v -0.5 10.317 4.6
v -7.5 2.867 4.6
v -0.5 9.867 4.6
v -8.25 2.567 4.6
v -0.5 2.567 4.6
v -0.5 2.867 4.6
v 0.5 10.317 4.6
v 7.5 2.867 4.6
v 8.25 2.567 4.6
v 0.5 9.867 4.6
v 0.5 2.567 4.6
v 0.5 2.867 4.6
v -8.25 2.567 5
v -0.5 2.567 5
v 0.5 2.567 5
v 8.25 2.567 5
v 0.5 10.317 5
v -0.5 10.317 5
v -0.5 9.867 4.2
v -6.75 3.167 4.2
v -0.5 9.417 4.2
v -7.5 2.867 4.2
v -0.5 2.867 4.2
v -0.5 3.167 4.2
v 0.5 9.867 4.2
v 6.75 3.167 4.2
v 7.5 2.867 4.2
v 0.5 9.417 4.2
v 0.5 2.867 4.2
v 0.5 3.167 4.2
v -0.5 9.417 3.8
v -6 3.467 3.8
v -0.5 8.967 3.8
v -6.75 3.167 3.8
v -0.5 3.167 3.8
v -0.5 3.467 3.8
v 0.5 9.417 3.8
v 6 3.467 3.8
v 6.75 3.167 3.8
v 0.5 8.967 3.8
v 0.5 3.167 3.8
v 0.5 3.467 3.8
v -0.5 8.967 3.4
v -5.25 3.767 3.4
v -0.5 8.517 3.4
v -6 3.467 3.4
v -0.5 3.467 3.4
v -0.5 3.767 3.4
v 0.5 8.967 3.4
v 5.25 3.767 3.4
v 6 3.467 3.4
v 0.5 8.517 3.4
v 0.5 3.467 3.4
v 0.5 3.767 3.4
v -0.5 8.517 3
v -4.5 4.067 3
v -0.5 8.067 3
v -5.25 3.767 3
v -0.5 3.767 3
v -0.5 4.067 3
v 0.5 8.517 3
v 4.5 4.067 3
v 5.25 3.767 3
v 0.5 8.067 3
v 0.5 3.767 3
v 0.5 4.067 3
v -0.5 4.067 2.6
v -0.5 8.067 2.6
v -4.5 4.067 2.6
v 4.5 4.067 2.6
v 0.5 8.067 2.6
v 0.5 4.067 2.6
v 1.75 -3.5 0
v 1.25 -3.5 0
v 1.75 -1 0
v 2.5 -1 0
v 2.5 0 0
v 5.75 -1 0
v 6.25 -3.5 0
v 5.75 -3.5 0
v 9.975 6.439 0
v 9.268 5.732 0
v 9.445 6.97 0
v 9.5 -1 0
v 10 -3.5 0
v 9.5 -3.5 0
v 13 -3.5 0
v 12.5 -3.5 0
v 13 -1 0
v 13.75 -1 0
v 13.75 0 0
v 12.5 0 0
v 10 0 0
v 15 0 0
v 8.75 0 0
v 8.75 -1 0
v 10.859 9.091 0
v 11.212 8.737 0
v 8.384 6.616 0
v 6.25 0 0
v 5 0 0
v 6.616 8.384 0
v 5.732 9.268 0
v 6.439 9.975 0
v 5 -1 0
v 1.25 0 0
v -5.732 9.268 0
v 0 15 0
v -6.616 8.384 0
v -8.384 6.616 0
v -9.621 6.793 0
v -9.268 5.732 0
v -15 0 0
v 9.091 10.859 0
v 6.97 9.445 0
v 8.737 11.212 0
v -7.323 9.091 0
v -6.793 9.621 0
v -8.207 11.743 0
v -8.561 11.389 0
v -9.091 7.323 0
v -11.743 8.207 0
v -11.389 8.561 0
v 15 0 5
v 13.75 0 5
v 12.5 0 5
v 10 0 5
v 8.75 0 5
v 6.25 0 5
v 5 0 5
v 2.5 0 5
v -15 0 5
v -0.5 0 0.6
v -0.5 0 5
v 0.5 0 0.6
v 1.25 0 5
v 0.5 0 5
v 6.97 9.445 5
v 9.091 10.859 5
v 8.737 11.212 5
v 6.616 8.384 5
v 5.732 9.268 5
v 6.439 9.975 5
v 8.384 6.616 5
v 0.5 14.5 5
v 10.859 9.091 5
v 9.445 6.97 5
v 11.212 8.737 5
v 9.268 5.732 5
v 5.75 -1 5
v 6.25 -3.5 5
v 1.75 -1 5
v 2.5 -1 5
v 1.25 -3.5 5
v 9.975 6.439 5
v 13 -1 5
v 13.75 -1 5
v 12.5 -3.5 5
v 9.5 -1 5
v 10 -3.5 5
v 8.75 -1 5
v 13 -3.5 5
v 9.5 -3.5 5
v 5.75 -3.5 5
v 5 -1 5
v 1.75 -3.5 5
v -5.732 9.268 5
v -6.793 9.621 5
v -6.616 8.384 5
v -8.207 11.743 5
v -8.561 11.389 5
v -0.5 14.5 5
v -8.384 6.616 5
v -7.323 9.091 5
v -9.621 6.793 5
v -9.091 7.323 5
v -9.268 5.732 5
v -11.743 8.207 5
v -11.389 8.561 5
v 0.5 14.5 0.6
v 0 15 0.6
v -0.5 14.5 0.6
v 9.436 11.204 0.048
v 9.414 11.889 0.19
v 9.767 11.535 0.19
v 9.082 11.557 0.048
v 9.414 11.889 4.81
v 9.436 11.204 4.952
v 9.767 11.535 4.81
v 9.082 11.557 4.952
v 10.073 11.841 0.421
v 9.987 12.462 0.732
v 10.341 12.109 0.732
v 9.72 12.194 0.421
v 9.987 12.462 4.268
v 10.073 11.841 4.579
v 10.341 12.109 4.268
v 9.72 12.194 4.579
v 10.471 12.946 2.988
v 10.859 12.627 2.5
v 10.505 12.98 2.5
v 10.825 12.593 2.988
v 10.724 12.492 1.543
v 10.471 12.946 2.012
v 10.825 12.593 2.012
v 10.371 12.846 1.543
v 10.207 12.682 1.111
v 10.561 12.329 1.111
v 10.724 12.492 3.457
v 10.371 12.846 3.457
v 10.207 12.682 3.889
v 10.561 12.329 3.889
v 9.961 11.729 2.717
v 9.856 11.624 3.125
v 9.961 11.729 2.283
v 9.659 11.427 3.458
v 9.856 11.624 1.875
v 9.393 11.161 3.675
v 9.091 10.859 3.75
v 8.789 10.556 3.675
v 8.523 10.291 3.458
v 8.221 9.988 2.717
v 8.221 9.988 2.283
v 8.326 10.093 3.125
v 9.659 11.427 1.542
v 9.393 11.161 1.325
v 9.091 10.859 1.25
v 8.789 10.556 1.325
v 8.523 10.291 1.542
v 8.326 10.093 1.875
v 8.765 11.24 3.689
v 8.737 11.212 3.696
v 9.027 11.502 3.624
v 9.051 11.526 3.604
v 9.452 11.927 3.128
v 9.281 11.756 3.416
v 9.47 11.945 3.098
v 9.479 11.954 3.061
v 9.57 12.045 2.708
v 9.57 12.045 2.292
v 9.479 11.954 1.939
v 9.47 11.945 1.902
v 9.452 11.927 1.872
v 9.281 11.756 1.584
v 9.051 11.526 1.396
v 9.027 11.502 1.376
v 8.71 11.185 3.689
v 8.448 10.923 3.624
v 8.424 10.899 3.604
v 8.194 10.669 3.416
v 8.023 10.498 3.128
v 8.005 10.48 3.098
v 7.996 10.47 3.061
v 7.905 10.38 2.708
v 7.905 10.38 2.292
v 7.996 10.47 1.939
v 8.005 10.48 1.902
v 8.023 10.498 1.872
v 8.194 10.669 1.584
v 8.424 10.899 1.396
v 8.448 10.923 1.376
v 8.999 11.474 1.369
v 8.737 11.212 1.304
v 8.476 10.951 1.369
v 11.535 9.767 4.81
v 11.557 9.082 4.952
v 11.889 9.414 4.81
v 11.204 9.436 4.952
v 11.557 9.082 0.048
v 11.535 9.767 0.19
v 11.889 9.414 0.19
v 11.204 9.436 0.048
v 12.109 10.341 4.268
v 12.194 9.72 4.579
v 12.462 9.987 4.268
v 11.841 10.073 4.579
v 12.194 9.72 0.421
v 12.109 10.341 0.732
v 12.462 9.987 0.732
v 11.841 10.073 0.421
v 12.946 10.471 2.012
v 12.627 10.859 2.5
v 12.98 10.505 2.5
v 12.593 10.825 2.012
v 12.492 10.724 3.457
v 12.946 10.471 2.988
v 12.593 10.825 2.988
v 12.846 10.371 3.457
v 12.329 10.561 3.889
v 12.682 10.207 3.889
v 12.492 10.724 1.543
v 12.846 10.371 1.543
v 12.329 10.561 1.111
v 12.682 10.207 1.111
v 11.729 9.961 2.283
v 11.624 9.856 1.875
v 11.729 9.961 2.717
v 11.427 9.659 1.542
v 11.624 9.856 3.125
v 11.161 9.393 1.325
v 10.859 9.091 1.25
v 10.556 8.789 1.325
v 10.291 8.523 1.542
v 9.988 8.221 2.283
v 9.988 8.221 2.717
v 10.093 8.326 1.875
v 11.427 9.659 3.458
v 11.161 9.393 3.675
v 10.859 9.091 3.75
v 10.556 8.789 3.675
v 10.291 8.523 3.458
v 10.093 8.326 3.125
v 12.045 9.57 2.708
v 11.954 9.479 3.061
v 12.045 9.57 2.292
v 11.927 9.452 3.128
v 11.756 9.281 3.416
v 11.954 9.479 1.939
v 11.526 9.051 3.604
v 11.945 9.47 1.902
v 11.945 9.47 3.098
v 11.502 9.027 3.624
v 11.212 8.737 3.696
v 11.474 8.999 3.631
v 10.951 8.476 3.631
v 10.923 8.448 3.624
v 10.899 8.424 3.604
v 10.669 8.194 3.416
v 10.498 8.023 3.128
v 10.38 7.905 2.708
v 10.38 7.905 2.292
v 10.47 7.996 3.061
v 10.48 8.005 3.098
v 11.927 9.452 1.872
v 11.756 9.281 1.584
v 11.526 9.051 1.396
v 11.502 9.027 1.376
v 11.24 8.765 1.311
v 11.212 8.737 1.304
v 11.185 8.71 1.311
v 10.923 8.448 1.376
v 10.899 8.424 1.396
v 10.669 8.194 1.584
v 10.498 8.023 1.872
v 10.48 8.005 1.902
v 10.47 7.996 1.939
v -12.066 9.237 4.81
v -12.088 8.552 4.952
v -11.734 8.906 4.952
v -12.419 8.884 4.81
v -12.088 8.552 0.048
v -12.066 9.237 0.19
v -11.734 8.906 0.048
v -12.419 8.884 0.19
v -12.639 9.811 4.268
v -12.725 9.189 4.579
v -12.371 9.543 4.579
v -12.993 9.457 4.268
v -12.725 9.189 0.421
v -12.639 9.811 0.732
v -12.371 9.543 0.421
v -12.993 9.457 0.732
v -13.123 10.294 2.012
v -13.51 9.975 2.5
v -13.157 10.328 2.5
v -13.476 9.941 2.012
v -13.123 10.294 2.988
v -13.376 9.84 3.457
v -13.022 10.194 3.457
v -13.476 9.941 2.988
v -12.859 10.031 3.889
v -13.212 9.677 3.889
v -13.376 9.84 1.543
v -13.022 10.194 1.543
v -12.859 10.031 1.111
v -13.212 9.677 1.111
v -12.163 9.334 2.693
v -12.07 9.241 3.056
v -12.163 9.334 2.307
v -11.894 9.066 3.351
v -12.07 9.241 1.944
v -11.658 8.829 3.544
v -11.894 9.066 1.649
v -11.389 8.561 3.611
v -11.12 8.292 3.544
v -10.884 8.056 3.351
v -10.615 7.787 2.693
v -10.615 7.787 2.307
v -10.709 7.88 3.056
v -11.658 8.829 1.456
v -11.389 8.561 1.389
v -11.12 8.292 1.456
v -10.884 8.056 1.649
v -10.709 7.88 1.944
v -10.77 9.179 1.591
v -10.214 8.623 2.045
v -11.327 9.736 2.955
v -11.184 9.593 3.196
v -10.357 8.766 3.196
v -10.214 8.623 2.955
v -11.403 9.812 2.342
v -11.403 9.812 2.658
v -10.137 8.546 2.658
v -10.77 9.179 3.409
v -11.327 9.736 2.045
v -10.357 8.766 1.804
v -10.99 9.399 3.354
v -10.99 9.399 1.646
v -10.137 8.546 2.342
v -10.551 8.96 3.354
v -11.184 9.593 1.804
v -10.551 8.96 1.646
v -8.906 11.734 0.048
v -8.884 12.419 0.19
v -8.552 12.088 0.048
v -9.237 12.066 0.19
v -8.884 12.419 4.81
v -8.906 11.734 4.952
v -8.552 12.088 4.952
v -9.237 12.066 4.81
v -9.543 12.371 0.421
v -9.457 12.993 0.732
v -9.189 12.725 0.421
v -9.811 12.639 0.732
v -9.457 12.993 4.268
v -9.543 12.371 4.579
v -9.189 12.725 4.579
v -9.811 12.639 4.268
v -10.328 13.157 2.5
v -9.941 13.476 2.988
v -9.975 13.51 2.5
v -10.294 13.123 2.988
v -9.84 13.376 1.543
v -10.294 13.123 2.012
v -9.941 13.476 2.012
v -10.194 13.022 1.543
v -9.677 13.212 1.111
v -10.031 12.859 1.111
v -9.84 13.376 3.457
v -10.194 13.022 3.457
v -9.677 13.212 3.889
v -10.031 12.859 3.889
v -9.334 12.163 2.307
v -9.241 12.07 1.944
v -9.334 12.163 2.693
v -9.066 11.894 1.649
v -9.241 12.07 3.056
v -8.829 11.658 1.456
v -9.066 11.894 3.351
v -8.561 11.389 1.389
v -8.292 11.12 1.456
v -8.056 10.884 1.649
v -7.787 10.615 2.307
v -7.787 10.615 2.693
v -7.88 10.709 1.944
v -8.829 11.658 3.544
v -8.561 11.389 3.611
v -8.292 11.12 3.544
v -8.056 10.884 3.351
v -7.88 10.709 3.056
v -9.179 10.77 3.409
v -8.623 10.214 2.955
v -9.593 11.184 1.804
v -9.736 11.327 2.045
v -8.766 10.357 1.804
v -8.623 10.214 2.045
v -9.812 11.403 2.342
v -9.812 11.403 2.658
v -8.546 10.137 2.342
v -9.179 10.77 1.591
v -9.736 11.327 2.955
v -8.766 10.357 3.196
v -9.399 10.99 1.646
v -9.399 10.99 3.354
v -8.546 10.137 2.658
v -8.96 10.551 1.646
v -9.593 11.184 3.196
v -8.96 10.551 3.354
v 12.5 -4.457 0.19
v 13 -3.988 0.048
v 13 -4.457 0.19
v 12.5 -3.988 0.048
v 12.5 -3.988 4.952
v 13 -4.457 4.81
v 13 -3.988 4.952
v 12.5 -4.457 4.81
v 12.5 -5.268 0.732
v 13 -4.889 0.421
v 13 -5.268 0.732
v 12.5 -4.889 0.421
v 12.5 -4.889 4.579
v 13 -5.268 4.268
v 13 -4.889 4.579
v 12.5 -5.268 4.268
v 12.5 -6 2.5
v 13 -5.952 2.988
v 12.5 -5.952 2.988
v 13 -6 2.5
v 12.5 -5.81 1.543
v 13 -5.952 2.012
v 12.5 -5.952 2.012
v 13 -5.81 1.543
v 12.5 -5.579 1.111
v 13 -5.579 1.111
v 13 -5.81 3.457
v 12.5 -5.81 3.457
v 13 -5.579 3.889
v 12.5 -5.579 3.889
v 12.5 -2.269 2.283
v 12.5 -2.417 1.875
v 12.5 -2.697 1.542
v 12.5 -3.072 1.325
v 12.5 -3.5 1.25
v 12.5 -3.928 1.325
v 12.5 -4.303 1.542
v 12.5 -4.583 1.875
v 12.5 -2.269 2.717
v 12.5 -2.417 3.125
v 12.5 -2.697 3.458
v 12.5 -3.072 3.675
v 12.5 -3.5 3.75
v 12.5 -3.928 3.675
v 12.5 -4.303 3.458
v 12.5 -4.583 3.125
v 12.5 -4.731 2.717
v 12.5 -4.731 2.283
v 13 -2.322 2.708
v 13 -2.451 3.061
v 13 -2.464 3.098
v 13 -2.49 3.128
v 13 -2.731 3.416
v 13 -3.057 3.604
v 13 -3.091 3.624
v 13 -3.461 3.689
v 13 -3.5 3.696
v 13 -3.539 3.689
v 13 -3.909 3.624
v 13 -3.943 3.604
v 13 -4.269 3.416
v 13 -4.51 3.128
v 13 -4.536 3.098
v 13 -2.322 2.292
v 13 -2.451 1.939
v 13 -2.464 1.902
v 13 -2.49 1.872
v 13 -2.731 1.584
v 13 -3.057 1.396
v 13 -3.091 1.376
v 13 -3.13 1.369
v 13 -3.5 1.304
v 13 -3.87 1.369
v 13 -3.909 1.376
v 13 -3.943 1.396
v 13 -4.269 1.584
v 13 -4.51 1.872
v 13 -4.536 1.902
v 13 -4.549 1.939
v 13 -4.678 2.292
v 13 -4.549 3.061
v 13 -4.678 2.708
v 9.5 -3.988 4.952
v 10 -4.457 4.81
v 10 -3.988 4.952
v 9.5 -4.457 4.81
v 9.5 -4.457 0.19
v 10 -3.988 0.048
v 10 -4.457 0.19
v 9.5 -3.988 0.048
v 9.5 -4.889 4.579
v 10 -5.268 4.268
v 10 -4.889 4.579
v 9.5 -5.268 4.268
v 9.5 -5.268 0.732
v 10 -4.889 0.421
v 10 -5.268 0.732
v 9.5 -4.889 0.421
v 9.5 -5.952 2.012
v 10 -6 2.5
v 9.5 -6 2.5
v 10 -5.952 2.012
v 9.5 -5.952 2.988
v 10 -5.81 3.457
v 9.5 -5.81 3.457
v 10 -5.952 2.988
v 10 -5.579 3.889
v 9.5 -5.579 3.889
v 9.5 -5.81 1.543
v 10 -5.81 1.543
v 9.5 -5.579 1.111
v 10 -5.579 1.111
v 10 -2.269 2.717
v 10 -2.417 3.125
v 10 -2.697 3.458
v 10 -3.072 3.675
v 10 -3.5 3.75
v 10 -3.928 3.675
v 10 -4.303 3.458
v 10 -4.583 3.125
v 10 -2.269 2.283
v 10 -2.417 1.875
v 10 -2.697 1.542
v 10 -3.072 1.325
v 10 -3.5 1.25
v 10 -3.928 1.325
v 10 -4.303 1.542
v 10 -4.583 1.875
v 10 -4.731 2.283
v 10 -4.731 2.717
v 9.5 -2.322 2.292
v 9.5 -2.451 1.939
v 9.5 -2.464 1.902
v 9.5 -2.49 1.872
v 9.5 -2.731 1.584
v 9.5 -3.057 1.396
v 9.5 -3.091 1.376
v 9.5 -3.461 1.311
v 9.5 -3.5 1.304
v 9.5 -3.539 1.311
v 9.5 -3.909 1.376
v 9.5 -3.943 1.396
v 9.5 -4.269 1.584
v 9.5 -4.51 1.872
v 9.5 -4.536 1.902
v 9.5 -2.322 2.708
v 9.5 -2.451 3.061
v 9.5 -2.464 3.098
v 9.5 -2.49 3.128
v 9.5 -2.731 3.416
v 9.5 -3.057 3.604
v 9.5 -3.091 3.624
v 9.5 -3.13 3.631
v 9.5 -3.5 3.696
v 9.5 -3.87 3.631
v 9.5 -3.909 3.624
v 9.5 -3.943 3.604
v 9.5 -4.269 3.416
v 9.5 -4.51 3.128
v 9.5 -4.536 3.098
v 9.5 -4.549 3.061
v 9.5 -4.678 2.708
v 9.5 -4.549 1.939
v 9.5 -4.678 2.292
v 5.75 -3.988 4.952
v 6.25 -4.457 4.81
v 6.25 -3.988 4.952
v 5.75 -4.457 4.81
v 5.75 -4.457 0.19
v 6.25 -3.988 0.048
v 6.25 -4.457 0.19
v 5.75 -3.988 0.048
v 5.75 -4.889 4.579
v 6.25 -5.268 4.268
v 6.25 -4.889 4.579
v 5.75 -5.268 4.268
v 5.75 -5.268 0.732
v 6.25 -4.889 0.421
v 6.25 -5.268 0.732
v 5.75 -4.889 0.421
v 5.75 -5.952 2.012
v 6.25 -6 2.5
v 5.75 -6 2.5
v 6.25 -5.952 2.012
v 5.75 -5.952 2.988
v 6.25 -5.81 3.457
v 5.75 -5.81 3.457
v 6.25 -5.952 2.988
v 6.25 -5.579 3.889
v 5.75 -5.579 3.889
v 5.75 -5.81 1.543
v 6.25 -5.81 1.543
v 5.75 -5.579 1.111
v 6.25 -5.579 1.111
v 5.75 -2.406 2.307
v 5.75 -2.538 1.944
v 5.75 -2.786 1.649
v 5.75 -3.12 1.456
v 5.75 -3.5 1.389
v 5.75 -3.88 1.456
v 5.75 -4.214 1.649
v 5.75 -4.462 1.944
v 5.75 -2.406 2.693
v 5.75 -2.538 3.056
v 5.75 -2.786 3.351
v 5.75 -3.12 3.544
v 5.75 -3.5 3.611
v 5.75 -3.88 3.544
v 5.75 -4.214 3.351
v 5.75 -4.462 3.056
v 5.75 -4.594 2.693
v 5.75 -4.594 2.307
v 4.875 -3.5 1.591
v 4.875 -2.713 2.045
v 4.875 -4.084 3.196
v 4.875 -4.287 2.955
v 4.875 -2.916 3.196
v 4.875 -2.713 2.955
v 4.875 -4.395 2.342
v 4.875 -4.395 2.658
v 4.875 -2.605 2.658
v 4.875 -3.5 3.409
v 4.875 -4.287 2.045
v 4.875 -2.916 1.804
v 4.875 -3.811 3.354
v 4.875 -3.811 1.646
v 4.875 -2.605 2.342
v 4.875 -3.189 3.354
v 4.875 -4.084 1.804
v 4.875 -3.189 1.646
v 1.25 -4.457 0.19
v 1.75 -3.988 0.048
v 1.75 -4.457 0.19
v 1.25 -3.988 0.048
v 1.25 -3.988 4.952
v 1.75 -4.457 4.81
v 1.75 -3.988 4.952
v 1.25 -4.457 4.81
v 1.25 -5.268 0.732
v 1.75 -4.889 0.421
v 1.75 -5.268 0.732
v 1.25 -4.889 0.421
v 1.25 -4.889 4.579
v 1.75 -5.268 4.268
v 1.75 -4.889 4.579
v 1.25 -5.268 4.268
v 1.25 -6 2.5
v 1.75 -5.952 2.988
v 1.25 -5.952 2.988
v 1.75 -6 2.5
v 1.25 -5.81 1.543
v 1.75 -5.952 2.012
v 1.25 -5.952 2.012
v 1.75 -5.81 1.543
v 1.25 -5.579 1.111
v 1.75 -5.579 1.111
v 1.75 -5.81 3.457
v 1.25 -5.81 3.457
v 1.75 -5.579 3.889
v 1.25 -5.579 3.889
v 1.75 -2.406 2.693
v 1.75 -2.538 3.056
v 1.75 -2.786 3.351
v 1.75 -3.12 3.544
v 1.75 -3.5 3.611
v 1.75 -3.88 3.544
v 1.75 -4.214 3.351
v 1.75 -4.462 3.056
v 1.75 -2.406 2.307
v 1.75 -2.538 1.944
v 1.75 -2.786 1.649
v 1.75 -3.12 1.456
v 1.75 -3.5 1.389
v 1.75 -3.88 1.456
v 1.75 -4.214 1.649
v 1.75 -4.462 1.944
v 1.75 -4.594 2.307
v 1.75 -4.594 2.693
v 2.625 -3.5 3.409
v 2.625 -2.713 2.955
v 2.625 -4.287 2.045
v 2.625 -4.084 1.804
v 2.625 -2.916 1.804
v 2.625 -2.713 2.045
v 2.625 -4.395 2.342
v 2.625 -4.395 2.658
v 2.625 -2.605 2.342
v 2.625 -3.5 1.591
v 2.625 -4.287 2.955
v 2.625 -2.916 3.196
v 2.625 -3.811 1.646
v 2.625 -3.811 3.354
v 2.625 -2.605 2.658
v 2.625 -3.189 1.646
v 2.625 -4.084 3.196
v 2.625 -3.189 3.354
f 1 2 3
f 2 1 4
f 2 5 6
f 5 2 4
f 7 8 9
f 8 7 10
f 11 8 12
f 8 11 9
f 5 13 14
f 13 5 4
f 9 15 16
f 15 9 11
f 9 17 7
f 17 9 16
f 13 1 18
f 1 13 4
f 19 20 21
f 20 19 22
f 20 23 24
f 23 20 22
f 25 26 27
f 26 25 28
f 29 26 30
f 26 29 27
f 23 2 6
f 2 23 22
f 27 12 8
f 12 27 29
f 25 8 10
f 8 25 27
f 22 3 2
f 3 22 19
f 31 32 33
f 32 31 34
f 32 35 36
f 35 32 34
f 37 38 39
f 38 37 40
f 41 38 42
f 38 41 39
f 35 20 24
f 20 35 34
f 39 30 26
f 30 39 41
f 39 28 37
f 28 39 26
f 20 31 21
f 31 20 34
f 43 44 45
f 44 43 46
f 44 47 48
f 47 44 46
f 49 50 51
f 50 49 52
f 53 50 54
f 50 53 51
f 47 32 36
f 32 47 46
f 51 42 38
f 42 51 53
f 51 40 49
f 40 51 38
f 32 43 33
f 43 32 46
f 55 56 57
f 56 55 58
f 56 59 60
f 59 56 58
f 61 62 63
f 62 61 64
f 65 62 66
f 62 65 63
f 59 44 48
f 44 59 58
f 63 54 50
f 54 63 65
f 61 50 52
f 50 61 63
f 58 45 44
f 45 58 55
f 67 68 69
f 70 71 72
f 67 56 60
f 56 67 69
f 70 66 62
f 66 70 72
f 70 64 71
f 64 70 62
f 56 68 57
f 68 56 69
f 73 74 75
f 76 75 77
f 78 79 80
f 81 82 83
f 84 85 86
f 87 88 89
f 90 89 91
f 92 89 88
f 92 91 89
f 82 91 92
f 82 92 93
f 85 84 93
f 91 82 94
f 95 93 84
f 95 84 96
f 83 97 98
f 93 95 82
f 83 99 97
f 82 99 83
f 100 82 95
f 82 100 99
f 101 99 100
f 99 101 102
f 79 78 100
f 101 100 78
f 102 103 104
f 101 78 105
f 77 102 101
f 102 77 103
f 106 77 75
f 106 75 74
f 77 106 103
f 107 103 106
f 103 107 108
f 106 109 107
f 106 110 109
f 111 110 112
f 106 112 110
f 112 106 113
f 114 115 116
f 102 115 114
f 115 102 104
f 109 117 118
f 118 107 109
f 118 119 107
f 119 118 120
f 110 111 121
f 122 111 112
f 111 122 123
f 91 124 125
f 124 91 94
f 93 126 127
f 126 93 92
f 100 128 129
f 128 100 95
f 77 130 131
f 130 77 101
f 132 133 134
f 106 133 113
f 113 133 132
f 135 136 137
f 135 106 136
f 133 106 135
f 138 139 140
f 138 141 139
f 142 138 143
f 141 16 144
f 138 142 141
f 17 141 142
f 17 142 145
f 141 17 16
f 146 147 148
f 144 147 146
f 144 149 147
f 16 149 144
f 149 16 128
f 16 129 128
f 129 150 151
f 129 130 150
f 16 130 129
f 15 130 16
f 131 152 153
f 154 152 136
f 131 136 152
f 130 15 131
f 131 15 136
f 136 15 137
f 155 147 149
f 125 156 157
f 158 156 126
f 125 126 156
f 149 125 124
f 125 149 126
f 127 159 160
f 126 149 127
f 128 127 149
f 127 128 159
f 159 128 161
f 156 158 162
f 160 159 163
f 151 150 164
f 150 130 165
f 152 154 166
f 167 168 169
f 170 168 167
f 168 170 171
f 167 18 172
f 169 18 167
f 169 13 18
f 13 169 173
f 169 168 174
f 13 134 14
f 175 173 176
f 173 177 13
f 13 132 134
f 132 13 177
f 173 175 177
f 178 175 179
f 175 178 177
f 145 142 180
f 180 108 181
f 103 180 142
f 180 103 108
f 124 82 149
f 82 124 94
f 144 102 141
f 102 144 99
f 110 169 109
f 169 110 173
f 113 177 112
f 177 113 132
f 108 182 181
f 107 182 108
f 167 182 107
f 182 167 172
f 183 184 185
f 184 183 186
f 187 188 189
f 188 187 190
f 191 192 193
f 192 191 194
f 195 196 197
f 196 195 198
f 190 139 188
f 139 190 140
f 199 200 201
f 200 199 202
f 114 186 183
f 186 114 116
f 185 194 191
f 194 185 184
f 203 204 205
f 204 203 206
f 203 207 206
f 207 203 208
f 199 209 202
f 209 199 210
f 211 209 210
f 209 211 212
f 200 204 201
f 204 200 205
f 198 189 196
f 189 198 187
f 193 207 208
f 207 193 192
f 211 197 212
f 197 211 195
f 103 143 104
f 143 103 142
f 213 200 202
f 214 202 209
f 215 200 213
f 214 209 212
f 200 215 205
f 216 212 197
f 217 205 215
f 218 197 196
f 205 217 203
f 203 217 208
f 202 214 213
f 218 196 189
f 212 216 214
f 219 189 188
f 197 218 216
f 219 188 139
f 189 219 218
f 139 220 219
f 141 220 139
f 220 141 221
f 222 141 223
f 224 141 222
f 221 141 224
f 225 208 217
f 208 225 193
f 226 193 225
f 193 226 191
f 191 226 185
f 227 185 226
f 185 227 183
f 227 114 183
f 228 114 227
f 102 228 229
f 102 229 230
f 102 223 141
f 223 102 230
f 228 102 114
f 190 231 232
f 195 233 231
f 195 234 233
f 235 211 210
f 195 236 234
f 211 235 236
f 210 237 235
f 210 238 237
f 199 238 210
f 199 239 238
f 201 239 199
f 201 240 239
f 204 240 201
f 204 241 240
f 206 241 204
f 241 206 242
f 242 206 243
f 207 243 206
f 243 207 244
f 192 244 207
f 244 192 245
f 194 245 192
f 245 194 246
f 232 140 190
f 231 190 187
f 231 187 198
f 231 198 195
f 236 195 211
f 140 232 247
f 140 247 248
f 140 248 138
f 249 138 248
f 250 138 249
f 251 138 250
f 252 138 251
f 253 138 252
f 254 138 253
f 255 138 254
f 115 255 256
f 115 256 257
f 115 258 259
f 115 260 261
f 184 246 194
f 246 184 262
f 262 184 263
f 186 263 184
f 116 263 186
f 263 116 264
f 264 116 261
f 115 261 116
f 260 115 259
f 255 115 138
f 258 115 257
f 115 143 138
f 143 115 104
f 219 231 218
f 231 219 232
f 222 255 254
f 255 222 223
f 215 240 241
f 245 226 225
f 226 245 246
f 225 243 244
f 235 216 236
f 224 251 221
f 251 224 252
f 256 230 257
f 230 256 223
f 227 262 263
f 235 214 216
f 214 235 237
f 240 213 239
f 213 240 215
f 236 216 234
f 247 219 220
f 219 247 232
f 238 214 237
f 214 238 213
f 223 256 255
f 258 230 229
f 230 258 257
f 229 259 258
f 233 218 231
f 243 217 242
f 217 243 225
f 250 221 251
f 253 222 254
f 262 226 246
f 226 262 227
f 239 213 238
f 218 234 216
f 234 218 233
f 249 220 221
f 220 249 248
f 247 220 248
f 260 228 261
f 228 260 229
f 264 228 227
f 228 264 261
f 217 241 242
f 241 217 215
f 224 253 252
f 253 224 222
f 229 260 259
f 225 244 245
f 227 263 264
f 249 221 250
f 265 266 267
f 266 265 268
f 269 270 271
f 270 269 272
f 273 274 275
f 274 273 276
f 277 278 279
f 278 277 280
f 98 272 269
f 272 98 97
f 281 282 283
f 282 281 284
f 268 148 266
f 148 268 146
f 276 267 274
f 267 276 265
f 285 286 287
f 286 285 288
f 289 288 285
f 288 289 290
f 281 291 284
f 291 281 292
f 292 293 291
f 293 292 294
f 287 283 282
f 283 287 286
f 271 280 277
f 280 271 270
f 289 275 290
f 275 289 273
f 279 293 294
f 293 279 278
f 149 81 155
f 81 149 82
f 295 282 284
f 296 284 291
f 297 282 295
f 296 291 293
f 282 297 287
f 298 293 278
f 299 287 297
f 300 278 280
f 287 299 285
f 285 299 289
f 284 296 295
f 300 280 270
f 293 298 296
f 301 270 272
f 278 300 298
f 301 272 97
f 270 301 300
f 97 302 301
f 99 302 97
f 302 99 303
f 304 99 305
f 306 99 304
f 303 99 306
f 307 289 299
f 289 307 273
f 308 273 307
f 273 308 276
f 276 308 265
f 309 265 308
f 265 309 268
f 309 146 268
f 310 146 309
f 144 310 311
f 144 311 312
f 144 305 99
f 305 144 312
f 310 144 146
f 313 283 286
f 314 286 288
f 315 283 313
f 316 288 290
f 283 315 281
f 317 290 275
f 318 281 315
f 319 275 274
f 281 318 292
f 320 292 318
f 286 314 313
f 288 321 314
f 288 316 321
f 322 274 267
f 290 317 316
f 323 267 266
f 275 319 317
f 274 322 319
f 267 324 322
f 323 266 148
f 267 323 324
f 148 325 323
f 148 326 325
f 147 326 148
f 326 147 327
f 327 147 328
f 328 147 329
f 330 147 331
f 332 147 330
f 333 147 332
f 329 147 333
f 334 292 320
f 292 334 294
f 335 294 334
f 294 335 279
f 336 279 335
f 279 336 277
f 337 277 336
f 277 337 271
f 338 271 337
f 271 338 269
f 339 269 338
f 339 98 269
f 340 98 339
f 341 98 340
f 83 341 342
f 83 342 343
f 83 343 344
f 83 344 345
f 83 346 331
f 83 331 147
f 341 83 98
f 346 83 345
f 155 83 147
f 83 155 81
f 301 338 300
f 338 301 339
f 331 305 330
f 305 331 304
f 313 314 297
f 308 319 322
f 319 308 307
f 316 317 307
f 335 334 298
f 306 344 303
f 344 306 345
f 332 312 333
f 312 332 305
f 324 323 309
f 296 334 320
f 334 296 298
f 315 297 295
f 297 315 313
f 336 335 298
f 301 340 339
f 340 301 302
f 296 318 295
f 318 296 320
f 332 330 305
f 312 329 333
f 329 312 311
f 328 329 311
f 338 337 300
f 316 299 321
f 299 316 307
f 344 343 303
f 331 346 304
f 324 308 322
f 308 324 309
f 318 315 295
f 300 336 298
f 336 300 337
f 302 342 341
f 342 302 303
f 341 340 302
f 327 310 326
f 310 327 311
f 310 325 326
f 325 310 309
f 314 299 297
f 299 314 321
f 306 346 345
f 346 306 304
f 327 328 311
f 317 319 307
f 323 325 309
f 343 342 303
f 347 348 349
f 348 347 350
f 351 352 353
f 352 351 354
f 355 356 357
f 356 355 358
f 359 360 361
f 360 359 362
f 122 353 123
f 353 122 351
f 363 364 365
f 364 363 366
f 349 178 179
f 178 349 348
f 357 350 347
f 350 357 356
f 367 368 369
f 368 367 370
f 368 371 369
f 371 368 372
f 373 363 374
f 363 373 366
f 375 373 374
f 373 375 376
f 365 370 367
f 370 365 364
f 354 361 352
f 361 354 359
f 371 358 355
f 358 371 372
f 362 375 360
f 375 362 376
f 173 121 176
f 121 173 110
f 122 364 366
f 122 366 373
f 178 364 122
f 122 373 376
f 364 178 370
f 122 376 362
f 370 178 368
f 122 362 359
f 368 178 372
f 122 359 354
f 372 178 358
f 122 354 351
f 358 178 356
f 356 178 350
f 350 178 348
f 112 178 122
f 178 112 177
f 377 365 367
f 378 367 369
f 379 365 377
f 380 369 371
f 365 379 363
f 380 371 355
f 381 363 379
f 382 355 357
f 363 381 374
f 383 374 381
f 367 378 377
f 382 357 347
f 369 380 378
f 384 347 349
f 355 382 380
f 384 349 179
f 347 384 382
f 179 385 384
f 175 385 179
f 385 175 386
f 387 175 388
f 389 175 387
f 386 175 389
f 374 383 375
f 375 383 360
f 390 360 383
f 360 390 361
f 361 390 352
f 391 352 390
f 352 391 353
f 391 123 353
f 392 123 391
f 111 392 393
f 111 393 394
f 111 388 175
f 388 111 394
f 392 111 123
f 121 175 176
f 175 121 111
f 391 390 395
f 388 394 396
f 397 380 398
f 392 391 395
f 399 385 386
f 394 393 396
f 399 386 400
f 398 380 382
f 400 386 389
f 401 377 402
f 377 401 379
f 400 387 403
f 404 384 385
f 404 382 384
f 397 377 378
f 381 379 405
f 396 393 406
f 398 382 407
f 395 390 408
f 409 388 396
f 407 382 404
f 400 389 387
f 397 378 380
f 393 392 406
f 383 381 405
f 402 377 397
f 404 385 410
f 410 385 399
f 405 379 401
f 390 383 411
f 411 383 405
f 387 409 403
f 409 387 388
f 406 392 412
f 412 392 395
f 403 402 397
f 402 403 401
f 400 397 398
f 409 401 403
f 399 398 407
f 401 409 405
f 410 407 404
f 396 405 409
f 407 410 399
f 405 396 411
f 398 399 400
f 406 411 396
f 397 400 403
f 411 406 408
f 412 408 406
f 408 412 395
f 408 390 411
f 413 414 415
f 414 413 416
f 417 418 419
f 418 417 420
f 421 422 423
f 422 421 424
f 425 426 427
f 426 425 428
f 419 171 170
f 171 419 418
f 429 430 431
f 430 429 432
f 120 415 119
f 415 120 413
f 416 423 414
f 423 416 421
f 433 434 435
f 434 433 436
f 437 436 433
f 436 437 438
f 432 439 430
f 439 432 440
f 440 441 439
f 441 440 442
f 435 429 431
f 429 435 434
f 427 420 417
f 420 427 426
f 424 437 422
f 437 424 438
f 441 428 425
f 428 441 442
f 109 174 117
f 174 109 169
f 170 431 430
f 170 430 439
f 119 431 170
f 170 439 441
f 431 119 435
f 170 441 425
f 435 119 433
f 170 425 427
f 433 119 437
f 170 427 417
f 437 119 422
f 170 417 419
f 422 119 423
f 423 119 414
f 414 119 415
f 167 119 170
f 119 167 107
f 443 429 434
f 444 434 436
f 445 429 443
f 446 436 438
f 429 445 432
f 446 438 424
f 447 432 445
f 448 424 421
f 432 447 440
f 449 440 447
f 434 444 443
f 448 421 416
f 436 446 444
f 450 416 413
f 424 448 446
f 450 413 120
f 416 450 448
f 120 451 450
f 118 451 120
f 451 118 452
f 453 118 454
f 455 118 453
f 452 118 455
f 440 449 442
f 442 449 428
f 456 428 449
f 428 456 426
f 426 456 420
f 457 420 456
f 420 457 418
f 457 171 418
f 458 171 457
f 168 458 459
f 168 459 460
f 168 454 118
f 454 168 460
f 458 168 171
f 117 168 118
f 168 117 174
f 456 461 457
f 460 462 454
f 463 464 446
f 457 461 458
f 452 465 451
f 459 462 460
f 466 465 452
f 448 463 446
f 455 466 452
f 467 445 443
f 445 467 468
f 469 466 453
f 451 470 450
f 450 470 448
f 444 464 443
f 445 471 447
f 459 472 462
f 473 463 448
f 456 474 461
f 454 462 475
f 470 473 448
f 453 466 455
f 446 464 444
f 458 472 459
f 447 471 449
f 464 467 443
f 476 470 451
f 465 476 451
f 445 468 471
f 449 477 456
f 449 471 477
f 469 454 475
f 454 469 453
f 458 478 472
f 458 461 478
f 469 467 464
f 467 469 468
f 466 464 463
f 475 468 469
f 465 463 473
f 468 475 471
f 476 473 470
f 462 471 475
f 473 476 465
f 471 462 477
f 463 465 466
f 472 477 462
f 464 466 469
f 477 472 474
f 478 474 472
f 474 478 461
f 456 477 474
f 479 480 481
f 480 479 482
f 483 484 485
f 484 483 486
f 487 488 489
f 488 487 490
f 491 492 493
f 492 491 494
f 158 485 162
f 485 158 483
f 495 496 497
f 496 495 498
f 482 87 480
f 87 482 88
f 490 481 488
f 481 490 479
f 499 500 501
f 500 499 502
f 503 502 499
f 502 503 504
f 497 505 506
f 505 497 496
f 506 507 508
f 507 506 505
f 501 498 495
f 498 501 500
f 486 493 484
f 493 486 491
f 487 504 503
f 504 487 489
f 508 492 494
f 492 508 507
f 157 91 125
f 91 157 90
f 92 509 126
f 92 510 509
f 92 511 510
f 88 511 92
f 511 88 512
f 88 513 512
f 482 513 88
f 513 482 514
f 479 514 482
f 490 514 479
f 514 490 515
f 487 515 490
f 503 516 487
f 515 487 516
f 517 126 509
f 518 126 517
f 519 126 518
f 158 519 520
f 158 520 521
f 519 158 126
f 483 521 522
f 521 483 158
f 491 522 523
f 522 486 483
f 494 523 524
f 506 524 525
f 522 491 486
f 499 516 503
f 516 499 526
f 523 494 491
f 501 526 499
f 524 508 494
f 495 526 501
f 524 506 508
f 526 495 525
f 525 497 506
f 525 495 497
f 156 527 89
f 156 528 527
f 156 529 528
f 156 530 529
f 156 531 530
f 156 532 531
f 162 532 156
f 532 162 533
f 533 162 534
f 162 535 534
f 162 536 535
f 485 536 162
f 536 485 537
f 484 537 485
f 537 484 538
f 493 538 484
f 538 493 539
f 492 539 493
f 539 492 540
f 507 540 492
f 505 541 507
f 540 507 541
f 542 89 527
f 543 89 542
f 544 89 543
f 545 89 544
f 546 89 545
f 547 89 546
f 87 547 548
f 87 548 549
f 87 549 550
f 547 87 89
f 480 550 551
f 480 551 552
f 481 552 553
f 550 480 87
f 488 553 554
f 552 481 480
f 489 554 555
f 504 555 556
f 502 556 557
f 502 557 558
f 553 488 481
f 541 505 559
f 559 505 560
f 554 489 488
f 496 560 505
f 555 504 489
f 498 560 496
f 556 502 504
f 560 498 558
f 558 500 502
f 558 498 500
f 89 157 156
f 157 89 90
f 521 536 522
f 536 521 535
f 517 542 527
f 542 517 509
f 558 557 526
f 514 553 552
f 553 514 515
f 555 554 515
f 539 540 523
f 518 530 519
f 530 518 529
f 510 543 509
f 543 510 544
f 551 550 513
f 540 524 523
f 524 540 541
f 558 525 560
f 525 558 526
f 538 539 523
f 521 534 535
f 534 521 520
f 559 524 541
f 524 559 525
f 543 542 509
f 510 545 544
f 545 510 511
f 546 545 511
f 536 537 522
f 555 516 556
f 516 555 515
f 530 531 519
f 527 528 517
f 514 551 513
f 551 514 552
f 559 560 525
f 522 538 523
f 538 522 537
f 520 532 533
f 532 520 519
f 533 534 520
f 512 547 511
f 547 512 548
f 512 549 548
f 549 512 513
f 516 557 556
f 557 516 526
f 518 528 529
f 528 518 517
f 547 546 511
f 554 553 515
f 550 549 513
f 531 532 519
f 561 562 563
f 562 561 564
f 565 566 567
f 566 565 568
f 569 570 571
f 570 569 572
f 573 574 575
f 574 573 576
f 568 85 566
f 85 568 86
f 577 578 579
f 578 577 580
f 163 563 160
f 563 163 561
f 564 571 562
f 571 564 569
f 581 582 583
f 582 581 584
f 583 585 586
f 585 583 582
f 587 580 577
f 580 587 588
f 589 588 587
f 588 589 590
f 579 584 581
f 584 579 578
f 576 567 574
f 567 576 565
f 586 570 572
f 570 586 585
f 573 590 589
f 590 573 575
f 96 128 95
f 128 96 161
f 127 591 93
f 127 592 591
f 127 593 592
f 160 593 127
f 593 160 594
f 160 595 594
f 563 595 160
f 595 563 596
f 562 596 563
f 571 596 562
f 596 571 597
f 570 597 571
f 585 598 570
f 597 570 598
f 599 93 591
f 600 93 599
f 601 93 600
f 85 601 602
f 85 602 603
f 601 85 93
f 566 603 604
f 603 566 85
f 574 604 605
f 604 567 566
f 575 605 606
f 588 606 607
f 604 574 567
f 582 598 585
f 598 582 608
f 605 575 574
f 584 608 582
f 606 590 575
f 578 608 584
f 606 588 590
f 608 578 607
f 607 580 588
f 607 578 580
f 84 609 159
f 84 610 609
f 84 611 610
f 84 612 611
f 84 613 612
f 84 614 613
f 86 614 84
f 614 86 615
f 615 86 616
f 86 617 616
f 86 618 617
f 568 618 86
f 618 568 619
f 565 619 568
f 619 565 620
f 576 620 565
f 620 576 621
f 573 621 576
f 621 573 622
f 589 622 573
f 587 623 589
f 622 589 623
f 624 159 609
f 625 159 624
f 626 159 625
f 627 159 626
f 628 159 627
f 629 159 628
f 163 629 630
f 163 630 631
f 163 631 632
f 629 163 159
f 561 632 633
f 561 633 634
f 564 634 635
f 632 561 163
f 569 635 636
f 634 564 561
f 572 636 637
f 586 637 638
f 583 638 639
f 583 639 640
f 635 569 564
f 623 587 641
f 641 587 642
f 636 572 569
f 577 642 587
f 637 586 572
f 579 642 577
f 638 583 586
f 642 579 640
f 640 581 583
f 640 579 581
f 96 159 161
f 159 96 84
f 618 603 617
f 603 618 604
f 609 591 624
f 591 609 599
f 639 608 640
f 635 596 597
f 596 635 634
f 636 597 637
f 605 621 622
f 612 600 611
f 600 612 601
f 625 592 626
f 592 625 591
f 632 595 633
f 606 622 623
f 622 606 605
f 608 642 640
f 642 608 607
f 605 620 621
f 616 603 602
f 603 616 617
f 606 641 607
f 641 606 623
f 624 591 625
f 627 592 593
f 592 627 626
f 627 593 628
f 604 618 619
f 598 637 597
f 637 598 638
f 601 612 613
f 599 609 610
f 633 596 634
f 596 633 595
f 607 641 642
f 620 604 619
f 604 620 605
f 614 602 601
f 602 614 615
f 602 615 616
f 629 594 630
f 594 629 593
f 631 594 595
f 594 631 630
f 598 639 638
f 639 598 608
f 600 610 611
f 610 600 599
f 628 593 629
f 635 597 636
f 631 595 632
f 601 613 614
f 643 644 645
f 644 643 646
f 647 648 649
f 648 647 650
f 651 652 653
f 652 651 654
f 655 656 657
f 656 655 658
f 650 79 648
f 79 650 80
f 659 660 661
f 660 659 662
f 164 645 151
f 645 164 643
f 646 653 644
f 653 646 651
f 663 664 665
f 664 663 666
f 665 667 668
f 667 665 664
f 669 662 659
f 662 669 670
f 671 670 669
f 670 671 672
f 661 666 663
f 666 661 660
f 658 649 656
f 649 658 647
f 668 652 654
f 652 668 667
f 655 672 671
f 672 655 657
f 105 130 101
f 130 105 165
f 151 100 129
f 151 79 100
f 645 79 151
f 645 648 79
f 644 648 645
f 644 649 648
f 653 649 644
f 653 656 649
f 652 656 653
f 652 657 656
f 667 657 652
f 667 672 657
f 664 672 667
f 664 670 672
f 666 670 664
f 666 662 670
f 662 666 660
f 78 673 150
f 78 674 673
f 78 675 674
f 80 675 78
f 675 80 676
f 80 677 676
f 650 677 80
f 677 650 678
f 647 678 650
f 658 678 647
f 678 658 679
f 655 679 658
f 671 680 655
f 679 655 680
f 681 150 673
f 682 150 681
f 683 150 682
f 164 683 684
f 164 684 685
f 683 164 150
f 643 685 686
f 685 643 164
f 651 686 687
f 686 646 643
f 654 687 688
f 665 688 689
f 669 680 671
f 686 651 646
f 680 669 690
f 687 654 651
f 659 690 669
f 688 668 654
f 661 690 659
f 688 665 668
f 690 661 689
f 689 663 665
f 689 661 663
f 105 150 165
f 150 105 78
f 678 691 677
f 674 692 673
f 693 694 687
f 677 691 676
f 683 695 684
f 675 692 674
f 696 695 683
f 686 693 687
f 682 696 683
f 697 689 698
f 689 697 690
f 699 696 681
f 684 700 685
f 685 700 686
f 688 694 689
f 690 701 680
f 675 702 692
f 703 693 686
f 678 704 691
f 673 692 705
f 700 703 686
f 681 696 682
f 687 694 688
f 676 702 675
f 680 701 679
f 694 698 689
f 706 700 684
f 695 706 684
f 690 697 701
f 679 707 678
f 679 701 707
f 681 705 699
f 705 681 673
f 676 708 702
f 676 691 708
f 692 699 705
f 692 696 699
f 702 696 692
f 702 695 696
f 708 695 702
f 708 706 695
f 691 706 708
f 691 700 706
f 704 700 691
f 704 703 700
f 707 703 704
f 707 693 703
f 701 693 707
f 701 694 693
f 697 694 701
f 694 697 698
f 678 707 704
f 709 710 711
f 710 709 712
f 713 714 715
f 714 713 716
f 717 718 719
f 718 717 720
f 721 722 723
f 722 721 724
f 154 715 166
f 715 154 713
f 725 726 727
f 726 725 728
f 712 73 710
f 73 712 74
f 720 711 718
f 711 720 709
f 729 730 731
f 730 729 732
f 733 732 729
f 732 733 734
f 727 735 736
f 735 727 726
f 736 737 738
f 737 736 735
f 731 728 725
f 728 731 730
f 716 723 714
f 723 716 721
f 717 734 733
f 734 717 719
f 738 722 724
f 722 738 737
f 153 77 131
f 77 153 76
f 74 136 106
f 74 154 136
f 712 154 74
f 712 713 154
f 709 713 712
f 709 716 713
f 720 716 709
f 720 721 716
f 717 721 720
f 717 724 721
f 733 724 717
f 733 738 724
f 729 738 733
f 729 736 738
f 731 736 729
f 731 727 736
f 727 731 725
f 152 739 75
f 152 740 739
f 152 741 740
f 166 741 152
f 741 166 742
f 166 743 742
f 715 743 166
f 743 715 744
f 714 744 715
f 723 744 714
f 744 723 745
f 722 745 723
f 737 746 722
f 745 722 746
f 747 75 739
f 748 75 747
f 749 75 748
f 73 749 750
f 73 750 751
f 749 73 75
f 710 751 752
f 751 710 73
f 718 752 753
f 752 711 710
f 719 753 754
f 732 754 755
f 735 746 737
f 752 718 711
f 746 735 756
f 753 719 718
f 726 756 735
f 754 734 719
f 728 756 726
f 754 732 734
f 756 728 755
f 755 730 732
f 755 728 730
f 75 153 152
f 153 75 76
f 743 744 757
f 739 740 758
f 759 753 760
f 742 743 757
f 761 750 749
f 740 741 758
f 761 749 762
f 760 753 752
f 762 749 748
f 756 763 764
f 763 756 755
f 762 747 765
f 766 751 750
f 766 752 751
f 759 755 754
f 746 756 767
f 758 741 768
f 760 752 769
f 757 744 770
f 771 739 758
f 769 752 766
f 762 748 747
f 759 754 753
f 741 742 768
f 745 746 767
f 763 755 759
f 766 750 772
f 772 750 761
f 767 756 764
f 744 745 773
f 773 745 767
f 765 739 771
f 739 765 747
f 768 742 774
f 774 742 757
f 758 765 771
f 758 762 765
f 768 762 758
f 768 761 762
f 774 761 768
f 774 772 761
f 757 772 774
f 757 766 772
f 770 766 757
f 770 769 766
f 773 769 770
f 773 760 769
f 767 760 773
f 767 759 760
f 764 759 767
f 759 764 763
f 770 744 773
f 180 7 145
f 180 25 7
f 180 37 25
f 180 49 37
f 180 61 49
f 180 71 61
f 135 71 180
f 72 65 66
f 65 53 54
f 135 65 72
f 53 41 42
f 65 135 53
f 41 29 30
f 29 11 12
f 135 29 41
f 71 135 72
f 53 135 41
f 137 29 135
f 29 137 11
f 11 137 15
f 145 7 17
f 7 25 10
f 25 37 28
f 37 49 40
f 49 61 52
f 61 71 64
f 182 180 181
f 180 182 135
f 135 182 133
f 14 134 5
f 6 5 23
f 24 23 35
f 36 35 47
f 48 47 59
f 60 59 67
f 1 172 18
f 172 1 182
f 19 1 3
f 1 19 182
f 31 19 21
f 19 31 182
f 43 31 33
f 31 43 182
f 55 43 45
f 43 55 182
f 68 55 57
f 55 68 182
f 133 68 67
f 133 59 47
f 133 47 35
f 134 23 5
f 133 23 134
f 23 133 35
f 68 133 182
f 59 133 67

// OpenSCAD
// file: common/helpers/getValue.scad
function getValue(variable, default) = variable == undef ? default : variable;
// file: common/joint/chain-joint.scad
/*

Generation a female / maile chain joint

After inclusion - use joint_f() or joint_m() modules as you like

Optional vars (with defaults):
JOINT_SIZE_X = 5;
JOINT_SIZE_Y = 5;
JOINT_SIZE_Z = 5;
*/

include <../helpers/getValue.scad>

JOINT_SIZE_X_ = getValue(JOINT_SIZE_X, 5);
JOINT_SIZE_Y_ = getValue(JOINT_SIZE_Y, 5);
JOINT_SIZE_Z_ = getValue(JOINT_SIZE_Z, 3);

JOINT_CYLINDER_H = 0.5;
JOINT_WALL_THICKNESS = JOINT_CYLINDER_H * 2.5;
JOINT_OUTER_WALL_THICKNESS = JOINT_CYLINDER_H;

RADIUS = JOINT_SIZE_Z_ / 2;

module joint_common_side() {
  difference() {
    hull() {
      translate([0, JOINT_SIZE_Y_ - RADIUS, RADIUS])
        rotate([0, 90, 0])
          cylinder(r = RADIUS, h = JOINT_WALL_THICKNESS, $fn = 32);
      cube([JOINT_WALL_THICKNESS, 1, JOINT_SIZE_Z_]);
    }
    translate([JOINT_OUTER_WALL_THICKNESS, JOINT_SIZE_Y_ - RADIUS * 2, 0])
      cube([JOINT_WALL_THICKNESS, RADIUS * 2.1, JOINT_SIZE_Z_]);
  }
}

module joint_side_m() {
  joint_common_side();
  translate([JOINT_CYLINDER_H, JOINT_SIZE_Y_ - RADIUS, JOINT_SIZE_Z_ / 2])
    rotate([0, 90, 0])
      cylinder(r = RADIUS / 2.25, r2 = RADIUS / 2.75, h = JOINT_CYLINDER_H * 1.75, $fn = 18);
}

module joint_side_f() {
  translate([JOINT_WALL_THICKNESS, 0, JOINT_SIZE_Z_]) {
    rotate([0, 180, 0]) {
        difference() {
        joint_common_side();
        translate([0, JOINT_SIZE_Y_ - RADIUS, JOINT_SIZE_Z_ / 2])
          rotate([0, 90, 0])
            cylinder(r = RADIUS / 2, r2 = RADIUS / 2.1, h = JOINT_CYLINDER_H * 1.1, $fn = 18);
        }
    }
  }
}

module joint_m() {
  translate([-JOINT_SIZE_X_ / 2, 0, 0]) {
      joint_side_m();
      translate([JOINT_SIZE_X_, 0, JOINT_SIZE_Z_])
        rotate([0, 180, 0])
          joint_side_m();
  }
}

module joint_f() {
  translate([-JOINT_SIZE_X_ / 2, 0, 0]) {
    joint_side_f();
    translate([JOINT_SIZE_X_, 0, JOINT_SIZE_Z_])
      rotate([0, 180, 0])
        joint_side_f();
  }
}
// main file
TRIANGLE_WIDTH = 30;
TRIANGLE_THICKNESS = 5;

FLEX_JOINT_WIDTH = 1;
FLEX_JOINT_HEIGHT = 0.6;

/** DO NOT EDIT FOLLOWING VARS **/

JOINT_SIZE_X = 5;
JOINT_SIZE_Y = 6;
JOINT_SIZE_Z = TRIANGLE_THICKNESS;

include <common/joint/chain-joint.scad>

module triangle() {
    X1 = 0 - TRIANGLE_WIDTH / 2;
    X2 = 0;
    X3 = TRIANGLE_WIDTH / 2;

    Y1 = 0;
    Y2 = TRIANGLE_WIDTH / 2;
    Y3 = 0;

    linear_extrude(TRIANGLE_THICKNESS) polygon([[X1, Y1], [X2, Y2], [X3, Y3]]);
}

module base() {
    STEP = 0.2;
    SCALE_STEP = 1 - STEP;
    ITERATIONS = 6;

    difference() {
        triangle();
        translate([0, TRIANGLE_WIDTH / 4.5, 0]) {
            union() {
                for(i=[1:ITERATIONS])
                    translate([0, 0 - STEP * 4, TRIANGLE_THICKNESS - STEP * i * 2])
                        scale([0.6 - STEP * i / 4, 0.6 - STEP * i / 4, 1])
                            translate([0, 0 - TRIANGLE_WIDTH / 5, 0])
                                triangle();
            }
        }
    }
}

module base_model() {
    union() {
        base();

        translate([TRIANGLE_WIDTH / 4, TRIANGLE_WIDTH / 4, 0])
          rotate(-45, [0, 0, 1])
            joint_f();

        translate([0 - TRIANGLE_WIDTH / 4, TRIANGLE_WIDTH / 4, 0])
          rotate(45, [0, 0, 1])
            joint_m();

        translate([TRIANGLE_WIDTH / 2, 0, 0]) {
            translate([0, 0, 0]) {
                rotate([0, 0, 180]) {
                    translate([TRIANGLE_WIDTH / 8, 0, 0]) {
                        joint_f();
                        translate([TRIANGLE_WIDTH / 4, 0, 0])
                            joint_m();
                    }
                }
            }
        }
    }
}

module assembly() {
    difference() {
        base_model();
        translate([0 - FLEX_JOINT_WIDTH / 2, -0.1, FLEX_JOINT_HEIGHT])
            cube([FLEX_JOINT_WIDTH, TRIANGLE_WIDTH, TRIANGLE_THICKNESS]);
    }
}

assembly();
